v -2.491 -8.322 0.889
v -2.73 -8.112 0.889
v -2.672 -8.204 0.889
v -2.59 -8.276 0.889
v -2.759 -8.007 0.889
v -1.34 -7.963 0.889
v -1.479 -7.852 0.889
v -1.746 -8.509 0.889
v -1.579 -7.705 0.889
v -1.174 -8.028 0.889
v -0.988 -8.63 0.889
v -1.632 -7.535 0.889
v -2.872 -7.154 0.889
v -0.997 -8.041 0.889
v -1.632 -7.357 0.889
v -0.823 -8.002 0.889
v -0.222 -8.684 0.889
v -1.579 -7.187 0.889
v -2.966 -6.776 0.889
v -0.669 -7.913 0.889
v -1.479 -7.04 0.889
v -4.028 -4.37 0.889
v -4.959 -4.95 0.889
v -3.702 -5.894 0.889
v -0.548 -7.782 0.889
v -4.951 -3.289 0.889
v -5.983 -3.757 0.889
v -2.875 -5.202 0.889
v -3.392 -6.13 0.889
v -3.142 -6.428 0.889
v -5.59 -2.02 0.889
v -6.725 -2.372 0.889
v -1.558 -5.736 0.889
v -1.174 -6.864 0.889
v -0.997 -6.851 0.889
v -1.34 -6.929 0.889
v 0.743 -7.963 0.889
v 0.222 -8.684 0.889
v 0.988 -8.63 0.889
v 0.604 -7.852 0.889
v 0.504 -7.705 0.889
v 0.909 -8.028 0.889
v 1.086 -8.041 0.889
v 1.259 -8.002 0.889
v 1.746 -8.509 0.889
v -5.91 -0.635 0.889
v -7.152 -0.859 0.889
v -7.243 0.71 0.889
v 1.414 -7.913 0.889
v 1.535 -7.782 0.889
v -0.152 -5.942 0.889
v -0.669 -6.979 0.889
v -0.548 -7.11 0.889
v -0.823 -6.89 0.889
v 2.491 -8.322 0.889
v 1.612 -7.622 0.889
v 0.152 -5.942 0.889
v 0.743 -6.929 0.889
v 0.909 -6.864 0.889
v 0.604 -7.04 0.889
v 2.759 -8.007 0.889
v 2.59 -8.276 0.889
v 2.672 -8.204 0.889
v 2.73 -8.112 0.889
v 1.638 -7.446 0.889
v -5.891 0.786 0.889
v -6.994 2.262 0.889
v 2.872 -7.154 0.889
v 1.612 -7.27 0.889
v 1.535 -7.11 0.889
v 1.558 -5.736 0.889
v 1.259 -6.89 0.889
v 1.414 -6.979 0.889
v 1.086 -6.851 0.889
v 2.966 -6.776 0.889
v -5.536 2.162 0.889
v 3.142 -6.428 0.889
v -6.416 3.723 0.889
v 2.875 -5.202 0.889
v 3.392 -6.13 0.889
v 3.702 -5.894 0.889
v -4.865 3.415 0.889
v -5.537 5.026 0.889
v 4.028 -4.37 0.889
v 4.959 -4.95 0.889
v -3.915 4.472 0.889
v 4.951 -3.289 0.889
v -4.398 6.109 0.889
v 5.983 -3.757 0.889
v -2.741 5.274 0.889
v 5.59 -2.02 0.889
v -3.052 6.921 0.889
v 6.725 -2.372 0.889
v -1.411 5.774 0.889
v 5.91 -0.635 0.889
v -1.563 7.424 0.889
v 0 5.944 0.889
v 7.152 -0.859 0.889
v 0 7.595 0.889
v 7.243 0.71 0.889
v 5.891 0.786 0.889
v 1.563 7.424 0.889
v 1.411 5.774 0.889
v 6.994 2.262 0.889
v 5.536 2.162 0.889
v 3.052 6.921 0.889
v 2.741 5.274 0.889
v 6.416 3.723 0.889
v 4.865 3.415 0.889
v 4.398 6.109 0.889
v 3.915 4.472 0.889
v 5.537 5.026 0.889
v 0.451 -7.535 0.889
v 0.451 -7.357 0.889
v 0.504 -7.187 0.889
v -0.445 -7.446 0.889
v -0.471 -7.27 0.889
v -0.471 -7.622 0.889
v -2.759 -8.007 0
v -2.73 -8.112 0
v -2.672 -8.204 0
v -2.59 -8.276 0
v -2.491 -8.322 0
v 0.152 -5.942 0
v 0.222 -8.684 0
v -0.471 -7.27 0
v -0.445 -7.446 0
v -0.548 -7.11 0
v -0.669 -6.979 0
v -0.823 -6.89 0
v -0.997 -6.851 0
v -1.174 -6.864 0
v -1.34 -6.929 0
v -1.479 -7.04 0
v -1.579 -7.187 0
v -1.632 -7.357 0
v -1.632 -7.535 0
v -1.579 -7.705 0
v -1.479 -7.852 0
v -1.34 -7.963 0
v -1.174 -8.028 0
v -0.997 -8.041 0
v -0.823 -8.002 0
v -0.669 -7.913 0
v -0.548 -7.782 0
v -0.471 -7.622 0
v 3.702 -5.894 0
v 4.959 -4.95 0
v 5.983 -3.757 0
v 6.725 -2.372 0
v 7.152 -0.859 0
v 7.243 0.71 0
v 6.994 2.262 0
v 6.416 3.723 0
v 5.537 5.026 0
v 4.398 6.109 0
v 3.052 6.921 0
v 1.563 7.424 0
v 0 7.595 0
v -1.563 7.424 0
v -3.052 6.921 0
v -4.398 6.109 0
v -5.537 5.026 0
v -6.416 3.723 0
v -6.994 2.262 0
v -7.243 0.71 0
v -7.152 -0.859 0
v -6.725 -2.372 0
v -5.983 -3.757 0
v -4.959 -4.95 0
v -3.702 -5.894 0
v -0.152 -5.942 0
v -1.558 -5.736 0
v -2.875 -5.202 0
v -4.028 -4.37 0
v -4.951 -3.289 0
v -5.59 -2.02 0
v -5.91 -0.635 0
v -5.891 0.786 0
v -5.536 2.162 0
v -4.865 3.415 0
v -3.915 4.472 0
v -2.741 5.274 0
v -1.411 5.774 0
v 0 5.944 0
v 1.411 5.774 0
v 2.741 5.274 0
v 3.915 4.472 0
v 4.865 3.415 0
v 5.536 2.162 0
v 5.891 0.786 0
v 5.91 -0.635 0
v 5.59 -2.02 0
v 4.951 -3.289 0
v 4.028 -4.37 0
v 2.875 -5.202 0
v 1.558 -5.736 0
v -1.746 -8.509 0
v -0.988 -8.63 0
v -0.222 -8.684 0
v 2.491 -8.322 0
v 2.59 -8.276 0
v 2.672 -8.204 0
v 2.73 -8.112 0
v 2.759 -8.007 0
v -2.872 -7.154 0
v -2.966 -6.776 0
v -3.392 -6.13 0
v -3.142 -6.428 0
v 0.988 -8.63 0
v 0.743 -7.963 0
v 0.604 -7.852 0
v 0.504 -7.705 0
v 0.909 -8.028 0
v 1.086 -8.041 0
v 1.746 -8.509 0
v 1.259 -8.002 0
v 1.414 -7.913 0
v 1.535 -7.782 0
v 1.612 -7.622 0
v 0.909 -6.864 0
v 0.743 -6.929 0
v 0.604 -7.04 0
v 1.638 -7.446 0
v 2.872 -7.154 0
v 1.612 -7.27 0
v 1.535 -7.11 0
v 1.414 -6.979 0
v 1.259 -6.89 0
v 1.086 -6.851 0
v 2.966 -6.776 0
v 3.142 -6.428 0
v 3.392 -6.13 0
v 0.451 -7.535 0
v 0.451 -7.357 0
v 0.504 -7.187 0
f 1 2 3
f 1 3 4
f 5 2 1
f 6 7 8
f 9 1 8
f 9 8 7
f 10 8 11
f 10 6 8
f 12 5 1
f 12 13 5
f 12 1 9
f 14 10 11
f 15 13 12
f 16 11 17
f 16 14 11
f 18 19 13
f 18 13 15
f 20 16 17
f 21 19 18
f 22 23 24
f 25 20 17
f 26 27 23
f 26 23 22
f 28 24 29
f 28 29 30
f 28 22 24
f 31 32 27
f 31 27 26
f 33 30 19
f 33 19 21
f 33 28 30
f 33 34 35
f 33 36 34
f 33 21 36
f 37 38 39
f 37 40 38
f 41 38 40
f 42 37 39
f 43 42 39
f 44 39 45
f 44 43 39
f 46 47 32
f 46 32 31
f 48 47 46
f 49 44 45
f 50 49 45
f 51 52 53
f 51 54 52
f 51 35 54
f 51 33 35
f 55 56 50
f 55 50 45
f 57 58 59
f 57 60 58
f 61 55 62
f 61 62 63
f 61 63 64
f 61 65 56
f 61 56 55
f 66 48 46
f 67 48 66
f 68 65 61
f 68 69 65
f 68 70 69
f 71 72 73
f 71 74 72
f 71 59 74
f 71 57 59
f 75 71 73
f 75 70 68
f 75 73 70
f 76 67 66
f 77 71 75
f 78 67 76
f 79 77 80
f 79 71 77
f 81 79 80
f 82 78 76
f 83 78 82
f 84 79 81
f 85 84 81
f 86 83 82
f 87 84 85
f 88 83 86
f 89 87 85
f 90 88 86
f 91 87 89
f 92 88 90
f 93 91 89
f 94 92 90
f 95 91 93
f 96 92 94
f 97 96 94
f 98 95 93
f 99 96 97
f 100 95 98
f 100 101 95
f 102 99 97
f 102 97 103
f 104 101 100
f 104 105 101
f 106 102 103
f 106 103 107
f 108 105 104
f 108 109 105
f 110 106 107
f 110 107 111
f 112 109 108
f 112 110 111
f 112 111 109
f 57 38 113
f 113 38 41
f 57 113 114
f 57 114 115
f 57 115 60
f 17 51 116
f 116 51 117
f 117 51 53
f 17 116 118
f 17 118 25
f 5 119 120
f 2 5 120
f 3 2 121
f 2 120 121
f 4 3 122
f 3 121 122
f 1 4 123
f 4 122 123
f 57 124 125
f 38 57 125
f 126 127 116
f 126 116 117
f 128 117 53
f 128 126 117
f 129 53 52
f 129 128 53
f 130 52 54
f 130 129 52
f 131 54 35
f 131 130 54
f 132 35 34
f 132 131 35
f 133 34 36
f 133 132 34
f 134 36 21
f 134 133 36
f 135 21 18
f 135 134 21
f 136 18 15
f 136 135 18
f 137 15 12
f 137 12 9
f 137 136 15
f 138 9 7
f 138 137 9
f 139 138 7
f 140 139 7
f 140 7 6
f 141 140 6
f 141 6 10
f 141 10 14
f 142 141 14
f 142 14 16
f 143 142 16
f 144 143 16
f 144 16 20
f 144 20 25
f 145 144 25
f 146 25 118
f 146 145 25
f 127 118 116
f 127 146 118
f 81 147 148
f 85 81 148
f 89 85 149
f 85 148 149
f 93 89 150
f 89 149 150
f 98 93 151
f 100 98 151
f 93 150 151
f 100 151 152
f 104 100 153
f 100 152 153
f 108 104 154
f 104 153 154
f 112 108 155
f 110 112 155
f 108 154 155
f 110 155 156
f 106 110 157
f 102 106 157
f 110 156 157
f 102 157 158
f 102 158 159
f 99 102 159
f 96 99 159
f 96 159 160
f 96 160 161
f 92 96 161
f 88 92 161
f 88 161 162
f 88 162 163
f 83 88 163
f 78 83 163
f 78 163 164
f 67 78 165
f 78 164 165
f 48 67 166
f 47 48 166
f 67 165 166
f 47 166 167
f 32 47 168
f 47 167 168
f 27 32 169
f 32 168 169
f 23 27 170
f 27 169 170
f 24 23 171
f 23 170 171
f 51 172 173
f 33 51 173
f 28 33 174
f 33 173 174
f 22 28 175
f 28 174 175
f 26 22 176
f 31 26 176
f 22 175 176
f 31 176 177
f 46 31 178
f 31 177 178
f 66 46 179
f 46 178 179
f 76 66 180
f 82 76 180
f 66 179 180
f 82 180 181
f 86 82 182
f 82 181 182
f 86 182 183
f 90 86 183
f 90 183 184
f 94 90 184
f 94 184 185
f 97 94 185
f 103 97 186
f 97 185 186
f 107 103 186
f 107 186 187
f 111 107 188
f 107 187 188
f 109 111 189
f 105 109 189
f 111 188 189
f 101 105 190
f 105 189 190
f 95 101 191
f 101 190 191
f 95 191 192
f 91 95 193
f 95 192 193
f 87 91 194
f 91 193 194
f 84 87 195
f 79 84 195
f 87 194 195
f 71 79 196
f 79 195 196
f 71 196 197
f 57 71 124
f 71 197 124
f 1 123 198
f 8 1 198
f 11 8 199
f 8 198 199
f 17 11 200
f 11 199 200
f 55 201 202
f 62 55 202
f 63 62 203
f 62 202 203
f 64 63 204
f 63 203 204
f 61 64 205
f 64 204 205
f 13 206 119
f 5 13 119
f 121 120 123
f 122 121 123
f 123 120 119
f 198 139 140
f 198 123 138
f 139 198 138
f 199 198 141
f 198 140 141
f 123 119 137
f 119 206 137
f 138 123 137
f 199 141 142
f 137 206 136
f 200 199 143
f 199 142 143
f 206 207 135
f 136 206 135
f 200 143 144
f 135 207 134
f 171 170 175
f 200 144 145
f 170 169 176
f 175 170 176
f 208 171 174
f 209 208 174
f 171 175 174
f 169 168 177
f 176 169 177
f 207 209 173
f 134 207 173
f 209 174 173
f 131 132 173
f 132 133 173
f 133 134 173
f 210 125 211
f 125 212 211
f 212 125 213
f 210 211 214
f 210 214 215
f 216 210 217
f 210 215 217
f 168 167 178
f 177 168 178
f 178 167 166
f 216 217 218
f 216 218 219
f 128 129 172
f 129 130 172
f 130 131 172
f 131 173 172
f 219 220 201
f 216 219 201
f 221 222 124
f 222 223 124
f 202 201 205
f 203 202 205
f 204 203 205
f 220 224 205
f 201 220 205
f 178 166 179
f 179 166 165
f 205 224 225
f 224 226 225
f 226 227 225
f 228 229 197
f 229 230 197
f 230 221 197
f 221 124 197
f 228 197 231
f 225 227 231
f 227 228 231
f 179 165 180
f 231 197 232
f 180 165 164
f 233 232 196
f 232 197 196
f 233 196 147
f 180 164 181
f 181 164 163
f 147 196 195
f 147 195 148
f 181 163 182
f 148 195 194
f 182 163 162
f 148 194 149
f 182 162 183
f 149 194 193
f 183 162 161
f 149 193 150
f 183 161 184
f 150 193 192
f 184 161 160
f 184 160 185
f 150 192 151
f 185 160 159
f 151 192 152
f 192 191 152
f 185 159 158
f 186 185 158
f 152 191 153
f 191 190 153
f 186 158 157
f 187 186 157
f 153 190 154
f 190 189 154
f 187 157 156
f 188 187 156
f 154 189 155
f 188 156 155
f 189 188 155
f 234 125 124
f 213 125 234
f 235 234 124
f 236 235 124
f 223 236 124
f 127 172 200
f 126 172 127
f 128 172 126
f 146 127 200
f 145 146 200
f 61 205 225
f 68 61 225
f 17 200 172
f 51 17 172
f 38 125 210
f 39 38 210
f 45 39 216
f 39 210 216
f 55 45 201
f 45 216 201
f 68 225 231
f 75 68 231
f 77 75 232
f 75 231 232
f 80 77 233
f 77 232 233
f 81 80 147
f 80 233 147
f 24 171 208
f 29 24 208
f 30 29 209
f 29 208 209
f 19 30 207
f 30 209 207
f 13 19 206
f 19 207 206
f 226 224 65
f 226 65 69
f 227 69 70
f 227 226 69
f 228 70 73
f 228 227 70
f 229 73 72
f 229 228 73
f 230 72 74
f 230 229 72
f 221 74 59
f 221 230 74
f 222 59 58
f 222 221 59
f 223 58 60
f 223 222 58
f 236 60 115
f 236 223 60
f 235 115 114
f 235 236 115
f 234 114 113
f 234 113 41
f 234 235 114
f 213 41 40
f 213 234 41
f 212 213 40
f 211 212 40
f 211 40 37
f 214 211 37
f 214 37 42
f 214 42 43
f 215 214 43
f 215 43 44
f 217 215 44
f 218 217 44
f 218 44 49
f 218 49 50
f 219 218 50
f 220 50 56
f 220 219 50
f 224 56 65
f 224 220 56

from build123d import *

# Parameters (mm, degrees)
BODYSKETCH_R = 0.5969
BODY_DEPTH   = 0.889


with BuildPart() as part:
    # BodySketch → Body (new body)
    with BuildSketch(Plane.XY):
        with BuildLine():
            Line((0.152065789, -5.941654396), (0.22225, -8.683956424))
            ThreePointArc((0.22225, -8.683956424), (1.368573357, -8.578315756), (2.490862191, -8.322024981))
            ThreePointArc((2.490862191, -8.322024981), (2.671680086, -8.204051371), (2.759354342, -8.006754365))
            Line((2.759354342, -8.006754365), (2.871664527, -7.153673811))
            ThreePointArc((2.871664527, -7.153673811), (3.142109784, -6.428451286), (3.702191114, -5.894225443))
            ThreePointArc((3.702191114, -5.894225443), (0, 7.5946), (-3.702191114, -5.894225443))
            ThreePointArc((-3.702191114, -5.894225443), (-3.142109784, -6.428451286), (-2.871664527, -7.153673811))
            Line((-2.871664527, -7.153673811), (-2.759354342, -8.006754365))
            ThreePointArc((-2.759354342, -8.006754365), (-2.671680086, -8.204051371), (-2.490862191, -8.322024981))
            ThreePointArc((-2.490862191, -8.322024981), (-1.368573357, -8.578315756), (-0.22225, -8.683956424))
            Line((-0.22225, -8.683956424), (-0.152065789, -5.941654396))
            ThreePointArc((-0.152065789, -5.941654396), (0, 5.9436), (0.152065789, -5.941654396))
        make_face()
        with Locations((1.0414, -7.445926712)):
            Circle(BODYSKETCH_R, mode=Mode.SUBTRACT)
        with Locations((-1.0414, -7.445926712)):
            Circle(BODYSKETCH_R, mode=Mode.SUBTRACT)
    extrude(amount=BODY_DEPTH)


solid = part.part
